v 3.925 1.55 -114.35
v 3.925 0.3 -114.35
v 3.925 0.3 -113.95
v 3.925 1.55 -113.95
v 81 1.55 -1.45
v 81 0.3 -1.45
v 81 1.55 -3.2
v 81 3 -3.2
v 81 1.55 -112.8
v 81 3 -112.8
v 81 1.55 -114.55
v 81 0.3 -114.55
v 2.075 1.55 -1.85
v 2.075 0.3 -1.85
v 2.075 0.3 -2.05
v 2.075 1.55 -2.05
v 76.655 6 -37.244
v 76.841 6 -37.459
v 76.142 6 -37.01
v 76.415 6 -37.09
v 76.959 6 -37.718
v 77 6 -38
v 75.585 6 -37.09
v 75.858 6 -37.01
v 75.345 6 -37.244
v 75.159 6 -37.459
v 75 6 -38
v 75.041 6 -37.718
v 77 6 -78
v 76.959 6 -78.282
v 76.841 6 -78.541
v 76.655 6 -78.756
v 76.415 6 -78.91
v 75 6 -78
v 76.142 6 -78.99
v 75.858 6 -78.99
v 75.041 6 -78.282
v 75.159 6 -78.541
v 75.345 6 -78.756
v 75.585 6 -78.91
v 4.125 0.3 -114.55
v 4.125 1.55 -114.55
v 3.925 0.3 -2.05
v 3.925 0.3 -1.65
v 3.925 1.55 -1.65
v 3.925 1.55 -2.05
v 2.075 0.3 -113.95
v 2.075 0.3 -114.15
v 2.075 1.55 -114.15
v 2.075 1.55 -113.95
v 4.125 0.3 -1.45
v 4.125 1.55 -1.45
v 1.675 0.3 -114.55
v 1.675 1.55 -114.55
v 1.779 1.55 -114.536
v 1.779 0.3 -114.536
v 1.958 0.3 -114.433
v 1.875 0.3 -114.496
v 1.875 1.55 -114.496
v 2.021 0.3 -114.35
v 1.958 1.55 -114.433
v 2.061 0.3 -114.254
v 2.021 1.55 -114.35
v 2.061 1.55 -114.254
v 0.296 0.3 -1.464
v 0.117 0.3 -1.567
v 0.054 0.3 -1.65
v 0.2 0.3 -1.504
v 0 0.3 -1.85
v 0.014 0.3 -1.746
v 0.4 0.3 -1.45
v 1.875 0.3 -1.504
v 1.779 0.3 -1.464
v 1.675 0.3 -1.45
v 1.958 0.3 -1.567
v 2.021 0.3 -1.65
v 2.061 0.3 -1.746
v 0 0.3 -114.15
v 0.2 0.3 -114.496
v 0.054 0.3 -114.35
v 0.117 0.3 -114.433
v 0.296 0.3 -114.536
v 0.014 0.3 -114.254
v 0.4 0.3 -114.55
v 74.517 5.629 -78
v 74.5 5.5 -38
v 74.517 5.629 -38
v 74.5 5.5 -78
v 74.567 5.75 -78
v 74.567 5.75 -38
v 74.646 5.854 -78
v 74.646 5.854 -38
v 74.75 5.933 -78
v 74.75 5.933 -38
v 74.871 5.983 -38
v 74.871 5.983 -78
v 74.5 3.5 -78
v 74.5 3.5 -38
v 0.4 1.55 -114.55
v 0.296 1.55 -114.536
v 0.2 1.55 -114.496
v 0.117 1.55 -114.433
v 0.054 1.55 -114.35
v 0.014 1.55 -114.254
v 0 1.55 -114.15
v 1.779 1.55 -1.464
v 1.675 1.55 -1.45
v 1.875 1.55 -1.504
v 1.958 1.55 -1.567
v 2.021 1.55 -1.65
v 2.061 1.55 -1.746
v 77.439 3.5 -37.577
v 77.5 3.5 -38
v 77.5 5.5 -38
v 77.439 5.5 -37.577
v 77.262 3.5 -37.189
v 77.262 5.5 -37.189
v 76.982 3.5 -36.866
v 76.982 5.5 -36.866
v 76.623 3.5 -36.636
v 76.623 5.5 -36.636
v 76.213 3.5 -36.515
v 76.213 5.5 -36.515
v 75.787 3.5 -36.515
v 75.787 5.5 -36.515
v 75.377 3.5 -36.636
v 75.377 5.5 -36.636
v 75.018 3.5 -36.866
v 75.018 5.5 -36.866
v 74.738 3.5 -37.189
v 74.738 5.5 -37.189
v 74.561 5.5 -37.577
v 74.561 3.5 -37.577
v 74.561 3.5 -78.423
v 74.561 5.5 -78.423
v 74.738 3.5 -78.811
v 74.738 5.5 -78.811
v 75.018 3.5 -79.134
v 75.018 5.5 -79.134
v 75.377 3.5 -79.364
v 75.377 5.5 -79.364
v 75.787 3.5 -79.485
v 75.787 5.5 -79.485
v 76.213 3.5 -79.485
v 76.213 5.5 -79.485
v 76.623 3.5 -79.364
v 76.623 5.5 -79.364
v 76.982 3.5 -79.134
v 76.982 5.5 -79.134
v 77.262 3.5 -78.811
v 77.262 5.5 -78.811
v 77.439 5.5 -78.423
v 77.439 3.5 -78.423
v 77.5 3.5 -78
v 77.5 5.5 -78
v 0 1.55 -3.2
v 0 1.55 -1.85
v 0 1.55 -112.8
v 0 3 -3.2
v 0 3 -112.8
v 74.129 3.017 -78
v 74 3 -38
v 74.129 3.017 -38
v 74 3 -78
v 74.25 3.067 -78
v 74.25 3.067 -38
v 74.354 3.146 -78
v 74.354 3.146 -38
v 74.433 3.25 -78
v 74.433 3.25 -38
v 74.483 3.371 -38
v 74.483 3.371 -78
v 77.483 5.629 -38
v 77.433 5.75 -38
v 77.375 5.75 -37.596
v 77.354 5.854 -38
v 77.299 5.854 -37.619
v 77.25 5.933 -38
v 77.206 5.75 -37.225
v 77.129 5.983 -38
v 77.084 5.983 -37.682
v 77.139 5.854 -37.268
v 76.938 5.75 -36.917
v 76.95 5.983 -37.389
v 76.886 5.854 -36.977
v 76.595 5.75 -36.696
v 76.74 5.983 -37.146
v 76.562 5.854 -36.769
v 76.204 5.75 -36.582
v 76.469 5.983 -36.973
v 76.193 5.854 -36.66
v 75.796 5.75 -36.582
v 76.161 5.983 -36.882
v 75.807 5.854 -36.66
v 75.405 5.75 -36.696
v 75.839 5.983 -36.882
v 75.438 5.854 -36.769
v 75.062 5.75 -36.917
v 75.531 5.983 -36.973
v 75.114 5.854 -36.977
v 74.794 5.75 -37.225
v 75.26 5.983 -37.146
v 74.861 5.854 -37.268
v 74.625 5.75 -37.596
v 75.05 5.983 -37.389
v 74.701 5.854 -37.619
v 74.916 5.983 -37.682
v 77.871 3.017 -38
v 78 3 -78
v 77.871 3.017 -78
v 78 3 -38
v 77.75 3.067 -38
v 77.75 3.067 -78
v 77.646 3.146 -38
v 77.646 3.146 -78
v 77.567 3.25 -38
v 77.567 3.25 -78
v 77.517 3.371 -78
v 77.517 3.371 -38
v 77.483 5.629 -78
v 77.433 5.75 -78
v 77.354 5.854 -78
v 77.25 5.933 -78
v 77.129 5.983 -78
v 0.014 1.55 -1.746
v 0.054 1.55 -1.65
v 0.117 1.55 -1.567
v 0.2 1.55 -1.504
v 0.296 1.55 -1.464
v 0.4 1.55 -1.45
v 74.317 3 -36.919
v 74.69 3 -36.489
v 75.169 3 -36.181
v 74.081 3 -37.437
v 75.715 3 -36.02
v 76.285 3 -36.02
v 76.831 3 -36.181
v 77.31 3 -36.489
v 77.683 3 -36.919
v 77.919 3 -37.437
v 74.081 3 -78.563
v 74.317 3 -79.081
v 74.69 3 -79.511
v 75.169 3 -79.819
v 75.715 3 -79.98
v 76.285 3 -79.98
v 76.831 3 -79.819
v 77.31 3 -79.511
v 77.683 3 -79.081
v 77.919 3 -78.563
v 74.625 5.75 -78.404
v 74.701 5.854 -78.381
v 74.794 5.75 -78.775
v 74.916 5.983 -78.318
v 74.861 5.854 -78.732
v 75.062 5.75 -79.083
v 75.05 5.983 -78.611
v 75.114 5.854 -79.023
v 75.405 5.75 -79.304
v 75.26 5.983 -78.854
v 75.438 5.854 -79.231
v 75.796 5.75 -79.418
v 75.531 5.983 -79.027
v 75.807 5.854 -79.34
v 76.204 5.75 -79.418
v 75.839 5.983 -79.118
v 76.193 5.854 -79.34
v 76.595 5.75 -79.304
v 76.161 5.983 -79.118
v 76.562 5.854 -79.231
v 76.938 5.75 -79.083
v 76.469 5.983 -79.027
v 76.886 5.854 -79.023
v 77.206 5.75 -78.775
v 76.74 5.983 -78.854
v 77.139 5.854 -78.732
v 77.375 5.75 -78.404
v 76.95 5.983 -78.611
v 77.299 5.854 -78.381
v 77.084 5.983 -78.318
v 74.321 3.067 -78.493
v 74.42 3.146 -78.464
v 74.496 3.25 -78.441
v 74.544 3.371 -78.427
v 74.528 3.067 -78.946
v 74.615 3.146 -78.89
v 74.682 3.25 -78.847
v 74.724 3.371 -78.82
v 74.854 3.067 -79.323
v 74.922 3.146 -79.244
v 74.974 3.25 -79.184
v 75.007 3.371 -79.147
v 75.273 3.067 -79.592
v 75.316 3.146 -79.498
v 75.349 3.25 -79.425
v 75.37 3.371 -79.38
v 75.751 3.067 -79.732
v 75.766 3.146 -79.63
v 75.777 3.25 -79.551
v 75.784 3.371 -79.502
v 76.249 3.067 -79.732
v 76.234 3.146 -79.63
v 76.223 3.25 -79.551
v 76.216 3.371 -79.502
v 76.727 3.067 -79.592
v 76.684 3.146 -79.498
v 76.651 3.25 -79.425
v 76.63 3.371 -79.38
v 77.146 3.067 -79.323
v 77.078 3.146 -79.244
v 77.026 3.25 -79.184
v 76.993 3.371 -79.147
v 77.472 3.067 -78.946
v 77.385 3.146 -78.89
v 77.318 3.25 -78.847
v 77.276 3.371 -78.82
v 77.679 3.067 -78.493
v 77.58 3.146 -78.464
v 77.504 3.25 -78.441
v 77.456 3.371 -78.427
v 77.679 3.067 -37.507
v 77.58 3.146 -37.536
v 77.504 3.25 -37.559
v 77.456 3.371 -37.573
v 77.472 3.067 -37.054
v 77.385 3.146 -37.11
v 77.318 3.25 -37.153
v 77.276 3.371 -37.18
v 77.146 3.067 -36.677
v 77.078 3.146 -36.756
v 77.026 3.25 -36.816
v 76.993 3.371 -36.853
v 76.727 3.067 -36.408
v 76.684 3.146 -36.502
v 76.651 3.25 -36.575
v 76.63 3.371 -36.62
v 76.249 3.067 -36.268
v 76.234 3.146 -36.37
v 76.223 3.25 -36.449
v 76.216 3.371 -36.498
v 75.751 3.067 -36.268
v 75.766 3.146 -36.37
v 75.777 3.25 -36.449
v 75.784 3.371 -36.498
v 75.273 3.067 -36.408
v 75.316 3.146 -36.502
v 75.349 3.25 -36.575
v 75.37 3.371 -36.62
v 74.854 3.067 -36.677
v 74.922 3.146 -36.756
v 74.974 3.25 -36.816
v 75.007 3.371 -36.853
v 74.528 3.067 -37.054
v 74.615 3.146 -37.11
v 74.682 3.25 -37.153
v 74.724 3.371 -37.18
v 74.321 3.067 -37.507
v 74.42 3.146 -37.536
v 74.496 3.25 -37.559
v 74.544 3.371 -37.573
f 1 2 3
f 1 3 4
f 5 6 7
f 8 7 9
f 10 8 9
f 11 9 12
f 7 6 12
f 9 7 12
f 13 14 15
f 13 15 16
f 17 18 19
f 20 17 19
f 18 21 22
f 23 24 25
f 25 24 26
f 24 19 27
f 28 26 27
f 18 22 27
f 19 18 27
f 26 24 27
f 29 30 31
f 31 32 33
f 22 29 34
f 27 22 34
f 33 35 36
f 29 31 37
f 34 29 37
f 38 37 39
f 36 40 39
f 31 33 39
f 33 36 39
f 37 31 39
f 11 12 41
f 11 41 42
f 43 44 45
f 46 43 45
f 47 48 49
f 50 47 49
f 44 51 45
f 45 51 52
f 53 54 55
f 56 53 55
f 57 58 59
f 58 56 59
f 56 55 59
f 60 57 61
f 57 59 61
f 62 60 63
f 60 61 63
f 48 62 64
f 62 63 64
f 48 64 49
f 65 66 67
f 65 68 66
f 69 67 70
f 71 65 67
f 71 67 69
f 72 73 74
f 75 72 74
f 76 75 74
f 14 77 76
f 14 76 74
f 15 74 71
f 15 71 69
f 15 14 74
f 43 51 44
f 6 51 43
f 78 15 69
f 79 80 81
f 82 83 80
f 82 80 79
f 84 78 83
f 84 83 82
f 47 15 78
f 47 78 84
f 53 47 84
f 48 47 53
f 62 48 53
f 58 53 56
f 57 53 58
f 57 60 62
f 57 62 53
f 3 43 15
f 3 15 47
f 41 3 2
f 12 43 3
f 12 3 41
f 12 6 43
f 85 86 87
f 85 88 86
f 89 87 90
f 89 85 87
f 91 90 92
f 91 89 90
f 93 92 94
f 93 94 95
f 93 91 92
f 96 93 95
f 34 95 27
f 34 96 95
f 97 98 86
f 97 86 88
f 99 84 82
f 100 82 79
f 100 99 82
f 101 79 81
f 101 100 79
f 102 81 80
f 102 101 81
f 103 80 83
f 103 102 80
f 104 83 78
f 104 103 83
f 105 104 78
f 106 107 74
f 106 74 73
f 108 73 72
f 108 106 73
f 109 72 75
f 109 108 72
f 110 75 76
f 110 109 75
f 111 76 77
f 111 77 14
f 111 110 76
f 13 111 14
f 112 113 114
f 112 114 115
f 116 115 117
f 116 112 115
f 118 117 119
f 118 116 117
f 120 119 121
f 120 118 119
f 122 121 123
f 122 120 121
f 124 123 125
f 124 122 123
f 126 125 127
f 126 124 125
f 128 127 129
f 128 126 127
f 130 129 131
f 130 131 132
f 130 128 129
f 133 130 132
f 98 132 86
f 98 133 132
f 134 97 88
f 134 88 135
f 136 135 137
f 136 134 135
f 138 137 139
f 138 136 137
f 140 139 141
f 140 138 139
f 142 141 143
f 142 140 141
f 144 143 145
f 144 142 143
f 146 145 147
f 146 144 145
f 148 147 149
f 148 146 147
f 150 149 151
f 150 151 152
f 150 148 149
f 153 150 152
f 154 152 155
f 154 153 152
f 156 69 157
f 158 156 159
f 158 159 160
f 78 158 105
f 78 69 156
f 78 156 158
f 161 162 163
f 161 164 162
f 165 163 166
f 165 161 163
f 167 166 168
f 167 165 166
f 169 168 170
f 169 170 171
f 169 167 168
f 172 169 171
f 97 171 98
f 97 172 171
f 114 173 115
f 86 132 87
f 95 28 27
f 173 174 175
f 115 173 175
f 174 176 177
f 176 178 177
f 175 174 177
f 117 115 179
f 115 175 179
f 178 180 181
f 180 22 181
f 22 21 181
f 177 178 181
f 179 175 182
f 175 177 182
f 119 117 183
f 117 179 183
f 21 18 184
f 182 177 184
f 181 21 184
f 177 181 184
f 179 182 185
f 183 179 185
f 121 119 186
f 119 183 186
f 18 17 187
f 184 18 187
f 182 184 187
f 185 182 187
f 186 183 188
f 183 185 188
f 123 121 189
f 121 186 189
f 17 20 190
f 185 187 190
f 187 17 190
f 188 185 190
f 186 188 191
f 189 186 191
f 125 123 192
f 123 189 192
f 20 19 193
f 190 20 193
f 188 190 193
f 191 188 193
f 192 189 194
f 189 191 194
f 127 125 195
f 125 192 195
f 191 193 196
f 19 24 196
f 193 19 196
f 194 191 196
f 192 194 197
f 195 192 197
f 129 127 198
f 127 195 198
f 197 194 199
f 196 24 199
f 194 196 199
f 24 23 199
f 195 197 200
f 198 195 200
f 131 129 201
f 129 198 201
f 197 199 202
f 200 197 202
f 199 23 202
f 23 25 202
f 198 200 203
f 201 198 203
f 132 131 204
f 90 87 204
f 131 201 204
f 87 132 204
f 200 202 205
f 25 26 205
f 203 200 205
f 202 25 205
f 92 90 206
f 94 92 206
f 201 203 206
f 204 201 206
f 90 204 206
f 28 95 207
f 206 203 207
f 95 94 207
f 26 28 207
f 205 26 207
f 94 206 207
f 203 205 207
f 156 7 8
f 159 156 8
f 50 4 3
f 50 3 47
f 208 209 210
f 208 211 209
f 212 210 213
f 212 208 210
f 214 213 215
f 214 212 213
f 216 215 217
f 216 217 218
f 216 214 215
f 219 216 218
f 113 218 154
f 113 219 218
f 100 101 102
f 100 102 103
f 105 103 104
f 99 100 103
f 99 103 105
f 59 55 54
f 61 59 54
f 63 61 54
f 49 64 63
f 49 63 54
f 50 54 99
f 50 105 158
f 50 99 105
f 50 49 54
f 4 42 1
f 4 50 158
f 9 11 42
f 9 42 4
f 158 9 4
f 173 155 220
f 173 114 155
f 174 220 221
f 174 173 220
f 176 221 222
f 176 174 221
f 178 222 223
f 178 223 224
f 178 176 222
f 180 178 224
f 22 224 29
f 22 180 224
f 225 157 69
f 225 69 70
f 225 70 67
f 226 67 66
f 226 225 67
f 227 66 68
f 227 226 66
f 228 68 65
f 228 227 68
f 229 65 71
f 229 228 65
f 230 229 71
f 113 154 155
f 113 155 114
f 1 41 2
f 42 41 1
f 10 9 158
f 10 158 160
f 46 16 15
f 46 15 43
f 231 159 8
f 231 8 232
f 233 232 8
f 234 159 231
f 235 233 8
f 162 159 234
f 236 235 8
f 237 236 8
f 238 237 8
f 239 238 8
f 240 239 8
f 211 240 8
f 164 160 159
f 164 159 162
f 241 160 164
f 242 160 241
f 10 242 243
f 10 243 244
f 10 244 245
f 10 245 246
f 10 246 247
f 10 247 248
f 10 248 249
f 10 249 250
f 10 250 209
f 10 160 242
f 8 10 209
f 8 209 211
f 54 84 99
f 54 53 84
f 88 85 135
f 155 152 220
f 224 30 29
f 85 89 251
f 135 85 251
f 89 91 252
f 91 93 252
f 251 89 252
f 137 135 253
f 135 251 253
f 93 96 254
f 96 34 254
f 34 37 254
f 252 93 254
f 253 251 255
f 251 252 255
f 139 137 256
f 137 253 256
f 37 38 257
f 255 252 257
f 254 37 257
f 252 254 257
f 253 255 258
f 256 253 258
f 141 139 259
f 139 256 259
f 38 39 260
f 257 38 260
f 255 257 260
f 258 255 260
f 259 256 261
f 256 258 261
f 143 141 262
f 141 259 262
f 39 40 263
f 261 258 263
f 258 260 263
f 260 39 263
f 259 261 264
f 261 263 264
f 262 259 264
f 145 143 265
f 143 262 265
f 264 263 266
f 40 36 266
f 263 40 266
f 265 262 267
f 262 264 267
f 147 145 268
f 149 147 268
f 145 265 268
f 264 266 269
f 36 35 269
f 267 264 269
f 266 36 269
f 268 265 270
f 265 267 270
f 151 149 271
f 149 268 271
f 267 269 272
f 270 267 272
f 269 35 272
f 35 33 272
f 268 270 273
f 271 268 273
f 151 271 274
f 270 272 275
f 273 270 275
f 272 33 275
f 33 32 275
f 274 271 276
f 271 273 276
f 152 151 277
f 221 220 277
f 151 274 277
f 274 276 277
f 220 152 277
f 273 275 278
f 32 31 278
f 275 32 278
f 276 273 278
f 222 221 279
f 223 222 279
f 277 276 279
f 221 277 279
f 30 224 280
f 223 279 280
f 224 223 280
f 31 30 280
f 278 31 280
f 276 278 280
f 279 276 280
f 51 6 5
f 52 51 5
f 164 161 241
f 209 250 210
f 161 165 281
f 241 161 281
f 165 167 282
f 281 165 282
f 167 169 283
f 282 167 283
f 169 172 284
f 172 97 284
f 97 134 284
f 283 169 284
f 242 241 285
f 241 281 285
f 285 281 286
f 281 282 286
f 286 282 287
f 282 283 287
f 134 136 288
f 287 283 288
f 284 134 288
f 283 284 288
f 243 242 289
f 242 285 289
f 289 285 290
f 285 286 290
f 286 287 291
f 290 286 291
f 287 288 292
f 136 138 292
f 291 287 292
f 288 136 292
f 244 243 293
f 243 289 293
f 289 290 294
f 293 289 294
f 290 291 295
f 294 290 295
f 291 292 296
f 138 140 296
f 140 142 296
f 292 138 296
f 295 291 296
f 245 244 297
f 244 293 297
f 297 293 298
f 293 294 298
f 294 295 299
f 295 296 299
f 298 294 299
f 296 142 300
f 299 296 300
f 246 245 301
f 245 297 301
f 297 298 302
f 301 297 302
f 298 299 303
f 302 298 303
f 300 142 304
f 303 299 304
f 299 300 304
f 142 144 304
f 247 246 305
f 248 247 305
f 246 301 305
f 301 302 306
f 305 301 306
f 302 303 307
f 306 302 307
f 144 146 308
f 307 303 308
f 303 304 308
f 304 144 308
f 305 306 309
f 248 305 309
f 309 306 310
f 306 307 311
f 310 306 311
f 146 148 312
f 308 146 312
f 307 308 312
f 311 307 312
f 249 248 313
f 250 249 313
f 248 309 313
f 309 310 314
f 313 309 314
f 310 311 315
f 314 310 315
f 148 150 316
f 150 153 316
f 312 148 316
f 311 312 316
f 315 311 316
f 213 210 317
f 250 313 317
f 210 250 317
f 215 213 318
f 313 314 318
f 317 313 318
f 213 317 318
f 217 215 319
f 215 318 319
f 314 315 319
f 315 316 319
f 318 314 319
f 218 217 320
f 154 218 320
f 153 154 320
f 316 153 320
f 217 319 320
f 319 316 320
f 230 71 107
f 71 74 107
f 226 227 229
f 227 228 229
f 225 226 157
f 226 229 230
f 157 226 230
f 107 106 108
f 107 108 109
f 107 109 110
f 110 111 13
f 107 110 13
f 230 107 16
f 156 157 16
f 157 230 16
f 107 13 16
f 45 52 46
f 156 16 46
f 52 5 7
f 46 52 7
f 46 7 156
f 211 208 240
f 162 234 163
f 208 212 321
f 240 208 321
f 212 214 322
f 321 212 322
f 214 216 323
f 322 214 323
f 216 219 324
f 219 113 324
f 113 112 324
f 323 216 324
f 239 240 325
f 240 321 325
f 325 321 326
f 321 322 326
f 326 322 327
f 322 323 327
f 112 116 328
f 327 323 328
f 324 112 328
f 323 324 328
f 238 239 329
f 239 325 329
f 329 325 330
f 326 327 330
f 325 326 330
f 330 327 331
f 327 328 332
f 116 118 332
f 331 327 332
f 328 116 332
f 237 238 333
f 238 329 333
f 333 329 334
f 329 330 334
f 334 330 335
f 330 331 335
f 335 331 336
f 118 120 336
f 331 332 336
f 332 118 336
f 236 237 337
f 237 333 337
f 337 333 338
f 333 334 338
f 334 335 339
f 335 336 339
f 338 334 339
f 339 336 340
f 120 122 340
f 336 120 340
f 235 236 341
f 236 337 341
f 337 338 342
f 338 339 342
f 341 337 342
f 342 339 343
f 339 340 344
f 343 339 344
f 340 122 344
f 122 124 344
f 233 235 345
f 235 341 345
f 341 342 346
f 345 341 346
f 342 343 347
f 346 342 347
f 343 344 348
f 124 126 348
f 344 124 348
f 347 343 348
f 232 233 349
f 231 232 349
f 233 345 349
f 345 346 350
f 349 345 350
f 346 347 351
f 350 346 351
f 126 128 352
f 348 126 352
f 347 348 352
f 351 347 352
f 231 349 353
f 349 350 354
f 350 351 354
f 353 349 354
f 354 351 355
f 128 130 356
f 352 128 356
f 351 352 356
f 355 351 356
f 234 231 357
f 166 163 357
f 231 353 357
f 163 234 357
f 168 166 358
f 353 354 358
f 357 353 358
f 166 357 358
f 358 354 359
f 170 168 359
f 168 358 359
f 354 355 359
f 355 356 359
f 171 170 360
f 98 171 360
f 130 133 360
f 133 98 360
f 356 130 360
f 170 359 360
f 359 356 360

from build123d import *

# Parameters (mm, degrees)
SKETCH1_W           = 81
SKETCH1_H           = 116
BOSS_EXTRUDE1_DEPTH = 3
CUT_EXTRUDE2_DEPTH  = 81
CUT_EXTRUDE3_DEPTH  = 81
SKETCH6_W           = 1.85
SKETCH6_H           = 1.55
CUT_EXTRUDE5_DEPTH  = 0.6
FILLET6_R           = 0.4
CHAMFER2_SIZE       = 0.2
SKETCH7_W           = 1.85
SKETCH7_H           = 1.55
CUT_EXTRUDE6_DEPTH  = 0.6
FILLET7_R           = 0.4
CHAMFER3_SIZE       = 0.2
SKETCH10_W          = 81
SKETCH10_H          = 113.1
CUT_EXTRUDE7_DEPTH  = 0.2
FILLET8_R           = 0.4
BOSS_EXTRUDE2_DEPTH = 3
FILLET10_R          = 0.5
CUT_EXTRUDE8_REACH  = 142.423
SKETCH11_W          = 113.1
SKETCH11_H          = 0.1


with BuildPart() as part:
    # Sketch1 → Boss-Extrude1 (new body)
    with BuildSketch(Plane(origin=(0, 0, 0), x_dir=(1, 0, 0), z_dir=(0, 1, 0))):
        with Locations((40.5, 58)):
            Rectangle(SKETCH1_W, SKETCH1_H)
    extrude(amount=BOSS_EXTRUDE1_DEPTH)

    # Sketch2 → Cut-Extrude2 (cut)
    with BuildSketch(Plane(origin=(81, 0, 0), x_dir=(0, 0, -1), z_dir=(1, 0, 0))):
        Polygon((0, 3), (3, 3), (3, 1.75), (1.25, 1.75), (1.25, 0), (0, 0), align=None)
        Polygon((114.75, 0), (116, 0), (116, 3), (113, 3), (113, 1.75), (114.75, 1.75), align=None)
    extrude(amount=-CUT_EXTRUDE2_DEPTH, mode=Mode.SUBTRACT)

    # Sketch4 → Cut-Extrude3 (cut)
    with BuildSketch(Plane(origin=(81, 0, 0), x_dir=(0, 0, -1), z_dir=(1, 0, 0))):
        Polygon((3.2, 3), (3, 3), (3, 1.75), (1.25, 1.75), (1.25, 0), (1.45, 0), (1.45, 1.55), (3.2, 1.55), align=None)
        Polygon((114.75, 0), (114.55, 0), (114.55, 1.55), (112.8, 1.55), (112.8, 3), (113, 3), (113, 1.75), (114.75, 1.75), align=None)
    extrude(amount=-CUT_EXTRUDE3_DEPTH, mode=Mode.SUBTRACT)

    # Sketch6 → Cut-Extrude5 (cut)
    with BuildSketch(Plane.XY.offset(-1.45)):
        with Locations((3, 0.775)):
            Rectangle(SKETCH6_W, SKETCH6_H)
    extrude(amount=-CUT_EXTRUDE5_DEPTH, mode=Mode.SUBTRACT)

    # Fillet6
    fillet6_edges = [part.edges().sort_by_distance(p)[0] for p in [
        (2.075, 0.775, -1.45),
    ]]
    fillet(fillet6_edges, radius=FILLET6_R)

    # Chamfer2
    chamfer2_edges = [part.edges().sort_by_distance(p)[0] for p in [
        (3.925, 0.775, -1.45),
    ]]
    chamfer(chamfer2_edges, length=CHAMFER2_SIZE)

    # Sketch7 → Cut-Extrude6 (cut)
    with BuildSketch(Plane(origin=(0, 0, -114.55), x_dir=(-1, 0, 0), z_dir=(0, 0, -1))):
        with Locations((-3, 0.775)):
            Rectangle(SKETCH7_W, SKETCH7_H)
    extrude(amount=-CUT_EXTRUDE6_DEPTH, mode=Mode.SUBTRACT)

    # Fillet7
    fillet7_edges = [part.edges().sort_by_distance(p)[0] for p in [
        (2.075, 0.775, -114.55),
    ]]
    fillet(fillet7_edges, radius=FILLET7_R)

    # Chamfer3
    chamfer3_edges = [part.edges().sort_by_distance(p)[0] for p in [
        (3.925, 0.775, -114.55),
    ]]
    chamfer(chamfer3_edges, length=CHAMFER3_SIZE)

    # Sketch10 → Cut-Extrude7 (cut)
    with BuildSketch(Plane(origin=(0, 0, 0), x_dir=(-1, 0, 0), z_dir=(0, -1, 0))):
        with Locations((-40.5, 58)):
            Rectangle(SKETCH10_W, SKETCH10_H)
    extrude(amount=-CUT_EXTRUDE7_DEPTH, mode=Mode.SUBTRACT)

    # Fillet8
    fillet8_edges = [part.edges().sort_by_distance(p)[0] for p in [
        (0, 0.875, -114.55),
        (0, 0.875, -1.45),
    ]]
    fillet(fillet8_edges, radius=FILLET8_R)

    # Sketch9 → Boss-Extrude2 (add)
    with BuildSketch(Plane(origin=(0, 3, 0), x_dir=(1, 0, 0), z_dir=(0, 1, 0))):
        with BuildLine():
            Line((74.5, 38), (74.5, 78))
            ThreePointArc((74.5, 78), (76, 79.5), (77.5, 78))
            Line((77.5, 78), (77.5, 38))
            ThreePointArc((77.5, 38), (76, 36.5), (74.5, 38))
        make_face()
    extrude(amount=BOSS_EXTRUDE2_DEPTH)

    # Fillet10
    fillet10_edges = [part.edges().sort_by_distance(p)[0] for p in [
        (76, 3, -36.5),
        (77.5, 3, -58),
        (76, 3, -79.5),
        (74.5, 3, -58),
        (76, 6, -36.5),
        (77.5, 6, -58),
        (76, 6, -79.5),
        (74.5, 6, -58),
    ]]
    fillet(fillet10_edges, radius=FILLET10_R)

    # Cut-Extrude8: up to this face of the body (flat: up to its plane)
    cut_extrude8_end = Plane(part.part.faces().sort_by_distance((0, 1.591489816, -58))[0])
    # Sketch11 → Cut-Extrude8 (cut, up to the picked face)
    with BuildSketch(Plane(origin=(81, 0, 0), x_dir=(0, 0, -1), z_dir=(1, 0, 0)), mode=Mode.PRIVATE) as cut_extrude8_sk1:
        with Locations((58, 0.25)):
            Rectangle(SKETCH11_W, SKETCH11_H)
    cut_extrude8_tool1 = split(extrude(cut_extrude8_sk1.sketch, amount=-CUT_EXTRUDE8_REACH, mode=Mode.PRIVATE), bisect_by=cut_extrude8_end, keep=Keep.BOTH, mode=Mode.PRIVATE)
    add(cut_extrude8_tool1.solids().sort_by(Axis((81, 0.25, -58), (-1, 0, 0)))[0], mode=Mode.SUBTRACT)


solid = part.part
